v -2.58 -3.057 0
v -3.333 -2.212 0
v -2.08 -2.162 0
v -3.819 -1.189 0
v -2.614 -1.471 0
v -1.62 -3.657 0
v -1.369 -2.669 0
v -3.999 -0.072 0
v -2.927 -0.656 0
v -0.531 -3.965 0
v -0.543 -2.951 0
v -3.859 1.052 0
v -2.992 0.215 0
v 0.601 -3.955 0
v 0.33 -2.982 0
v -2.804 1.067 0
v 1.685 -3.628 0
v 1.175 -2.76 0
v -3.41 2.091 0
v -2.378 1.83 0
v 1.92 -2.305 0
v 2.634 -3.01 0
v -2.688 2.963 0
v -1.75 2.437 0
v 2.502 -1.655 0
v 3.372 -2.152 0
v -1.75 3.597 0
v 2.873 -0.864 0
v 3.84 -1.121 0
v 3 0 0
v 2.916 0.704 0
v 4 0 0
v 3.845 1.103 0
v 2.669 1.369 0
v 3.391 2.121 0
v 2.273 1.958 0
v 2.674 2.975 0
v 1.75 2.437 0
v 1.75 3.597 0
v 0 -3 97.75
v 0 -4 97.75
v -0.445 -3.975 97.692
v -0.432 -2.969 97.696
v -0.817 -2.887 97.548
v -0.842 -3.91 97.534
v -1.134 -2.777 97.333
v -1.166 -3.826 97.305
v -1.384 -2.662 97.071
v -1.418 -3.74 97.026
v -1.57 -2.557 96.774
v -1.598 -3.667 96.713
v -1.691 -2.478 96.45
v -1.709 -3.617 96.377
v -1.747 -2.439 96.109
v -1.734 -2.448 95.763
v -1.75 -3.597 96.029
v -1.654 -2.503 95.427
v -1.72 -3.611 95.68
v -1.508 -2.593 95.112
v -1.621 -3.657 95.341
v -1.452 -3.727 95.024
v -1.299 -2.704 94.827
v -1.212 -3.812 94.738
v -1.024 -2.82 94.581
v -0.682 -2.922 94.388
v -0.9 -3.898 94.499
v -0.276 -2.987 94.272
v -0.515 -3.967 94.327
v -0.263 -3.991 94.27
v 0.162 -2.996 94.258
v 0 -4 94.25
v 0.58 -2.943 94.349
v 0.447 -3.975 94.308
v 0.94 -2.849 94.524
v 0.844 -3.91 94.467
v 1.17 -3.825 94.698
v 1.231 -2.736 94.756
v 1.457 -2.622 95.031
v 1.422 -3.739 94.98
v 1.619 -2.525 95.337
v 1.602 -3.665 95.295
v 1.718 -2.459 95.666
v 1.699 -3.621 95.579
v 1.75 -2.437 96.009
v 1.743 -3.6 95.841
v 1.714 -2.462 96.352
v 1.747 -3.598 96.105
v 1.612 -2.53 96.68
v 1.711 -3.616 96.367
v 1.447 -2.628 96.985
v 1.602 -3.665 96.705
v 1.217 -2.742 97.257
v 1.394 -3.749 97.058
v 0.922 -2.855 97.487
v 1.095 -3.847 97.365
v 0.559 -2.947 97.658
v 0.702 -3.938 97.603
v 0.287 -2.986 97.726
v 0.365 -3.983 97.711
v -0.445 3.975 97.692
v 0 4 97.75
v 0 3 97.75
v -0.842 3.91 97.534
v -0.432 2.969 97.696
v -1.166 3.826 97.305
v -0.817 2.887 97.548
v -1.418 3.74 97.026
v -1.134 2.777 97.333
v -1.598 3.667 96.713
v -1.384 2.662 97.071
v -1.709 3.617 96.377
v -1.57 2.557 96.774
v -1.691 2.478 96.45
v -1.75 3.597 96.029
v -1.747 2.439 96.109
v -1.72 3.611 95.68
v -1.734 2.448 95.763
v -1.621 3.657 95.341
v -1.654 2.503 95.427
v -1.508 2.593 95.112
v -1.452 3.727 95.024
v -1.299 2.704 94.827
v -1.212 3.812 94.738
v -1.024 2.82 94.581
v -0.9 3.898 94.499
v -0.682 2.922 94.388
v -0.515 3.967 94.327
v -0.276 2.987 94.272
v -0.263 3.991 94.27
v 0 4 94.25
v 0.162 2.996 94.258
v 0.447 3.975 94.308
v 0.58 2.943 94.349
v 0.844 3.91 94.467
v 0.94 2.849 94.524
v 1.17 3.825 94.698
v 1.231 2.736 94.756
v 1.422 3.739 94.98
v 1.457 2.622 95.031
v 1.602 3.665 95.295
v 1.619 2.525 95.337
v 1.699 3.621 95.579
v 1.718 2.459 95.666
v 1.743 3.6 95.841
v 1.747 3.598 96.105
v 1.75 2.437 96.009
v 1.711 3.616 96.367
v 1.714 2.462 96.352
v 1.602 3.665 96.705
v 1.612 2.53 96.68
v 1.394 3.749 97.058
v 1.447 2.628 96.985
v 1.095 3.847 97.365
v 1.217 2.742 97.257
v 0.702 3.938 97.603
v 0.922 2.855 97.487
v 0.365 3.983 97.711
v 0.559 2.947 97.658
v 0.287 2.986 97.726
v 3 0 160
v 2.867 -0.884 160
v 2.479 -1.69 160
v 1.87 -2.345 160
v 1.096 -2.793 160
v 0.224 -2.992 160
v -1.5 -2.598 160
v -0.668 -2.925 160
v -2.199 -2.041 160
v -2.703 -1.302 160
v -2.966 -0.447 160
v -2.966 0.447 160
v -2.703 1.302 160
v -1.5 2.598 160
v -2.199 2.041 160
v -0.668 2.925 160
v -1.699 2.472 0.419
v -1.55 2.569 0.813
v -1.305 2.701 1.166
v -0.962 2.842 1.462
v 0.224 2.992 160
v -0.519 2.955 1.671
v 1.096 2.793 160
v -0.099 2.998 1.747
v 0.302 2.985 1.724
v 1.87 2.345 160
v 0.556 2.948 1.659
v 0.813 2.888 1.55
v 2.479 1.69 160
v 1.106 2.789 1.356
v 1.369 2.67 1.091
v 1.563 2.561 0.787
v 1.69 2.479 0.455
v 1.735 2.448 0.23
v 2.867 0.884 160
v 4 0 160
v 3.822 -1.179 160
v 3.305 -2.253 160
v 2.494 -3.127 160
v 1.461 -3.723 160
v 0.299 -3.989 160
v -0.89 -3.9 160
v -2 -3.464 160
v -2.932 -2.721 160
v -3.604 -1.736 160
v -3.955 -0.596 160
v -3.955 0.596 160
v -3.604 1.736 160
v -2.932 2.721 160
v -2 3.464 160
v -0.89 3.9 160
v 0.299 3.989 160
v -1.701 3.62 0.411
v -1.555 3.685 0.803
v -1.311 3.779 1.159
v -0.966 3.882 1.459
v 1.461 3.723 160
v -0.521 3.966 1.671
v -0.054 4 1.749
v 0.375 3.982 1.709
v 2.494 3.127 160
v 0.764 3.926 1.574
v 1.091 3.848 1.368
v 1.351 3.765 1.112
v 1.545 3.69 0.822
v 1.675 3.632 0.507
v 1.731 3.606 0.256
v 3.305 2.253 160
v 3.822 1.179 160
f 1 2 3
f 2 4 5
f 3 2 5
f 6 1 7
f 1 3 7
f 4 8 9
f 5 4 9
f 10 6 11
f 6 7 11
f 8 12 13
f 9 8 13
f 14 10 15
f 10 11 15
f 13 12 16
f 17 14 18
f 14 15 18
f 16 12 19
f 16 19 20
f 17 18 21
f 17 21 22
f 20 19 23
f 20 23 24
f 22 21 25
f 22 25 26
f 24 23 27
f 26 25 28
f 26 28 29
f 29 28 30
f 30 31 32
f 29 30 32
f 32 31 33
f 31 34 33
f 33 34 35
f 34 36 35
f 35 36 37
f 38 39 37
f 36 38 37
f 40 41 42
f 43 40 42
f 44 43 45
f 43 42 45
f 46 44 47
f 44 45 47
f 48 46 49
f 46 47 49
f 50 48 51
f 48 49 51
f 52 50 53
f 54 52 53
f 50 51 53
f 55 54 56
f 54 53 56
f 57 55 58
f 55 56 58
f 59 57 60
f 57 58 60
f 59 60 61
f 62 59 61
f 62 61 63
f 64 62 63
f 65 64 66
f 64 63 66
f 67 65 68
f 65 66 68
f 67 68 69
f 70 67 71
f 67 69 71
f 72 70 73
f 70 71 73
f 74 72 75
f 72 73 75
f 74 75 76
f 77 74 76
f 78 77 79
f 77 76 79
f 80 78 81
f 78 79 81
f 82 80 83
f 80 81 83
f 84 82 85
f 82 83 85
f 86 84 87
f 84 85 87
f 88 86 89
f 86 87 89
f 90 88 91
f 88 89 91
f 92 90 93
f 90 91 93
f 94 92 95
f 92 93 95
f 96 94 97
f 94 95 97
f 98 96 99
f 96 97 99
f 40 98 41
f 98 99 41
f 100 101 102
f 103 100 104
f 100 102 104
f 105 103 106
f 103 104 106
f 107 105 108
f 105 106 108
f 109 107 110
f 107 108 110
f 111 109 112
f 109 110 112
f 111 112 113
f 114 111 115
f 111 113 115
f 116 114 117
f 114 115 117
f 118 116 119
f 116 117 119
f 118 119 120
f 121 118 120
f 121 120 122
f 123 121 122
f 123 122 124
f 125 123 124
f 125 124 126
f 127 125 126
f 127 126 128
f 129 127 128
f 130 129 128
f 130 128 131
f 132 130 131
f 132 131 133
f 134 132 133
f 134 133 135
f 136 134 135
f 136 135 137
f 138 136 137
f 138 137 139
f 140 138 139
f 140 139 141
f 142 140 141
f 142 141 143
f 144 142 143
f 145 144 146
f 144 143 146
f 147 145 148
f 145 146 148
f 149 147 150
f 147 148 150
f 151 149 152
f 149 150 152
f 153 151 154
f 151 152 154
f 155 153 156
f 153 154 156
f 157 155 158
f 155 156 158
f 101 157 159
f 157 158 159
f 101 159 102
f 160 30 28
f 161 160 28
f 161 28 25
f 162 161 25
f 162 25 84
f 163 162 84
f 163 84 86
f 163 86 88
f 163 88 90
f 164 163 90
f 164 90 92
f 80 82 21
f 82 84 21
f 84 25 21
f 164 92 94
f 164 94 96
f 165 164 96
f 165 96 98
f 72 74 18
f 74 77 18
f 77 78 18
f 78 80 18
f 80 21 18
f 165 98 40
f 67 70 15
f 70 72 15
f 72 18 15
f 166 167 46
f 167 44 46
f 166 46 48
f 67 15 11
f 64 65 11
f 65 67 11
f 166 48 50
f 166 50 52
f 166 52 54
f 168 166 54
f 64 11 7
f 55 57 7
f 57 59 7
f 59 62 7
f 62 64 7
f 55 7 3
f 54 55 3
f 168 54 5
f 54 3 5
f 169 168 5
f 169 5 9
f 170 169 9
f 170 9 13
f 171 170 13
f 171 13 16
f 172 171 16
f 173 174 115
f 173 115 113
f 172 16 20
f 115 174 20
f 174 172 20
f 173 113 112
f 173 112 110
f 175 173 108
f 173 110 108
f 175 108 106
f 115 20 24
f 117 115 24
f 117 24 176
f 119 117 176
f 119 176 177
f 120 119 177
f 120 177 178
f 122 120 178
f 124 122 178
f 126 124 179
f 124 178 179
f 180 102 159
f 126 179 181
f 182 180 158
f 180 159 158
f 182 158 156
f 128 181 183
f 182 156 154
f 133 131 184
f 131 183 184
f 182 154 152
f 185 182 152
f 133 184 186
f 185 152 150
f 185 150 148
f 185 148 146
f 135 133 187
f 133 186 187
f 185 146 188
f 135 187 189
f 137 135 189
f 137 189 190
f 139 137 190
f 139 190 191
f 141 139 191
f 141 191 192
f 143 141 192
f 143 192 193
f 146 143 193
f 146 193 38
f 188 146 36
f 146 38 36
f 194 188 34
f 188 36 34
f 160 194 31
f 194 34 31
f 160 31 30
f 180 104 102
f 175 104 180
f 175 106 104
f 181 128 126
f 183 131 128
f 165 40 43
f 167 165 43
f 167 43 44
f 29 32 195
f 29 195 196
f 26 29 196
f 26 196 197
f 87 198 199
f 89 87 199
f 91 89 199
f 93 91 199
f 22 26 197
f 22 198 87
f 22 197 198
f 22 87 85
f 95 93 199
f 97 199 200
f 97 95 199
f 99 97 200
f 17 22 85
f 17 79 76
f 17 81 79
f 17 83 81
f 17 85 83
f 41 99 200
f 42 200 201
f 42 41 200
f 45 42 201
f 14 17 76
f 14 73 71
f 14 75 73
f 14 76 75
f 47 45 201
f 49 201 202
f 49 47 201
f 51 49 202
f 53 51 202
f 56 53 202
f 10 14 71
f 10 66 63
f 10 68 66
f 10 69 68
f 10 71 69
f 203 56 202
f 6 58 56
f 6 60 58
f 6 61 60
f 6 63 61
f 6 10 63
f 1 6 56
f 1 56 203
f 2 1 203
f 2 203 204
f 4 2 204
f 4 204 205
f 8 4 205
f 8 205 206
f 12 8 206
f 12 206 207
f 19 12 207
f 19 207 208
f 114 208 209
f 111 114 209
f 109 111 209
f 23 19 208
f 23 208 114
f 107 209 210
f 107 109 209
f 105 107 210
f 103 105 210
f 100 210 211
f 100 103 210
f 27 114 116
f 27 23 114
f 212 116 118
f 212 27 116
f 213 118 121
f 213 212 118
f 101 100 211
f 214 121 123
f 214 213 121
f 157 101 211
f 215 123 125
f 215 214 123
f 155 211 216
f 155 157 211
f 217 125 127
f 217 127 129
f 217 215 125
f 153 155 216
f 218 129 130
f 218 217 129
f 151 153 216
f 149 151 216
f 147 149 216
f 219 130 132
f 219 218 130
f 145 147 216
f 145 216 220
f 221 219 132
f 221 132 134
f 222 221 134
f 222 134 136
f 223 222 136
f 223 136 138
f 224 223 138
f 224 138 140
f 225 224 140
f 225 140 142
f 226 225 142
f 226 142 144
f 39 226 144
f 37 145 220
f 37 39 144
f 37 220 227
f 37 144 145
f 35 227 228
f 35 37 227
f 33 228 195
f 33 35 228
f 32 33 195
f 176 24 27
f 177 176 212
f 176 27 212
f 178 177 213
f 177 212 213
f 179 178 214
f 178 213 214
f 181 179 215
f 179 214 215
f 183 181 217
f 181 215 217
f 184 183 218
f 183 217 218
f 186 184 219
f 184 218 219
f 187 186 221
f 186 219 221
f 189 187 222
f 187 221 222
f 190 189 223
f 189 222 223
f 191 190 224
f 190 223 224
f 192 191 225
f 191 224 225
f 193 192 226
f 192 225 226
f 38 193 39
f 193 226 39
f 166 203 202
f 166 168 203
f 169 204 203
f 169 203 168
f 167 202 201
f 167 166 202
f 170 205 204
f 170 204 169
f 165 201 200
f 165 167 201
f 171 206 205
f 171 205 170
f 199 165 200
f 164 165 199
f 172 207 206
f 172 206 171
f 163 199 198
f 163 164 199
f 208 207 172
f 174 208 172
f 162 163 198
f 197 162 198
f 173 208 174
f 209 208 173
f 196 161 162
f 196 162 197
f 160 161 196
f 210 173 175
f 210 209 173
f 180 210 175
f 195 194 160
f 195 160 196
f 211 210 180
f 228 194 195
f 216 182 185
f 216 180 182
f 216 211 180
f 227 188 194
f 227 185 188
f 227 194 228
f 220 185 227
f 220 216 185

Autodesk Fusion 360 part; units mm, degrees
sketch "Esquisse1" plane through (0, 0, 0) normal (0, 0, 1) x (1, 0, 0)
  circle A0 centre (0, 0) radius 4
  circle A1 centre (0, 0) radius 3
  dimension "d1" = 8
  dimension "d2" = 6
extrude "Extrusion1" add sketch "Esquisse1" along normal blind 160
hole "Perçage1" at (0, 0, 0) direction (0, 1, 0) diameter 3.5 depth 8 tip angle 180
hole "Perçage2" at (0, 4, 96) direction (0, -1, 0) diameter 3.5 depth 8 tip angle 180
